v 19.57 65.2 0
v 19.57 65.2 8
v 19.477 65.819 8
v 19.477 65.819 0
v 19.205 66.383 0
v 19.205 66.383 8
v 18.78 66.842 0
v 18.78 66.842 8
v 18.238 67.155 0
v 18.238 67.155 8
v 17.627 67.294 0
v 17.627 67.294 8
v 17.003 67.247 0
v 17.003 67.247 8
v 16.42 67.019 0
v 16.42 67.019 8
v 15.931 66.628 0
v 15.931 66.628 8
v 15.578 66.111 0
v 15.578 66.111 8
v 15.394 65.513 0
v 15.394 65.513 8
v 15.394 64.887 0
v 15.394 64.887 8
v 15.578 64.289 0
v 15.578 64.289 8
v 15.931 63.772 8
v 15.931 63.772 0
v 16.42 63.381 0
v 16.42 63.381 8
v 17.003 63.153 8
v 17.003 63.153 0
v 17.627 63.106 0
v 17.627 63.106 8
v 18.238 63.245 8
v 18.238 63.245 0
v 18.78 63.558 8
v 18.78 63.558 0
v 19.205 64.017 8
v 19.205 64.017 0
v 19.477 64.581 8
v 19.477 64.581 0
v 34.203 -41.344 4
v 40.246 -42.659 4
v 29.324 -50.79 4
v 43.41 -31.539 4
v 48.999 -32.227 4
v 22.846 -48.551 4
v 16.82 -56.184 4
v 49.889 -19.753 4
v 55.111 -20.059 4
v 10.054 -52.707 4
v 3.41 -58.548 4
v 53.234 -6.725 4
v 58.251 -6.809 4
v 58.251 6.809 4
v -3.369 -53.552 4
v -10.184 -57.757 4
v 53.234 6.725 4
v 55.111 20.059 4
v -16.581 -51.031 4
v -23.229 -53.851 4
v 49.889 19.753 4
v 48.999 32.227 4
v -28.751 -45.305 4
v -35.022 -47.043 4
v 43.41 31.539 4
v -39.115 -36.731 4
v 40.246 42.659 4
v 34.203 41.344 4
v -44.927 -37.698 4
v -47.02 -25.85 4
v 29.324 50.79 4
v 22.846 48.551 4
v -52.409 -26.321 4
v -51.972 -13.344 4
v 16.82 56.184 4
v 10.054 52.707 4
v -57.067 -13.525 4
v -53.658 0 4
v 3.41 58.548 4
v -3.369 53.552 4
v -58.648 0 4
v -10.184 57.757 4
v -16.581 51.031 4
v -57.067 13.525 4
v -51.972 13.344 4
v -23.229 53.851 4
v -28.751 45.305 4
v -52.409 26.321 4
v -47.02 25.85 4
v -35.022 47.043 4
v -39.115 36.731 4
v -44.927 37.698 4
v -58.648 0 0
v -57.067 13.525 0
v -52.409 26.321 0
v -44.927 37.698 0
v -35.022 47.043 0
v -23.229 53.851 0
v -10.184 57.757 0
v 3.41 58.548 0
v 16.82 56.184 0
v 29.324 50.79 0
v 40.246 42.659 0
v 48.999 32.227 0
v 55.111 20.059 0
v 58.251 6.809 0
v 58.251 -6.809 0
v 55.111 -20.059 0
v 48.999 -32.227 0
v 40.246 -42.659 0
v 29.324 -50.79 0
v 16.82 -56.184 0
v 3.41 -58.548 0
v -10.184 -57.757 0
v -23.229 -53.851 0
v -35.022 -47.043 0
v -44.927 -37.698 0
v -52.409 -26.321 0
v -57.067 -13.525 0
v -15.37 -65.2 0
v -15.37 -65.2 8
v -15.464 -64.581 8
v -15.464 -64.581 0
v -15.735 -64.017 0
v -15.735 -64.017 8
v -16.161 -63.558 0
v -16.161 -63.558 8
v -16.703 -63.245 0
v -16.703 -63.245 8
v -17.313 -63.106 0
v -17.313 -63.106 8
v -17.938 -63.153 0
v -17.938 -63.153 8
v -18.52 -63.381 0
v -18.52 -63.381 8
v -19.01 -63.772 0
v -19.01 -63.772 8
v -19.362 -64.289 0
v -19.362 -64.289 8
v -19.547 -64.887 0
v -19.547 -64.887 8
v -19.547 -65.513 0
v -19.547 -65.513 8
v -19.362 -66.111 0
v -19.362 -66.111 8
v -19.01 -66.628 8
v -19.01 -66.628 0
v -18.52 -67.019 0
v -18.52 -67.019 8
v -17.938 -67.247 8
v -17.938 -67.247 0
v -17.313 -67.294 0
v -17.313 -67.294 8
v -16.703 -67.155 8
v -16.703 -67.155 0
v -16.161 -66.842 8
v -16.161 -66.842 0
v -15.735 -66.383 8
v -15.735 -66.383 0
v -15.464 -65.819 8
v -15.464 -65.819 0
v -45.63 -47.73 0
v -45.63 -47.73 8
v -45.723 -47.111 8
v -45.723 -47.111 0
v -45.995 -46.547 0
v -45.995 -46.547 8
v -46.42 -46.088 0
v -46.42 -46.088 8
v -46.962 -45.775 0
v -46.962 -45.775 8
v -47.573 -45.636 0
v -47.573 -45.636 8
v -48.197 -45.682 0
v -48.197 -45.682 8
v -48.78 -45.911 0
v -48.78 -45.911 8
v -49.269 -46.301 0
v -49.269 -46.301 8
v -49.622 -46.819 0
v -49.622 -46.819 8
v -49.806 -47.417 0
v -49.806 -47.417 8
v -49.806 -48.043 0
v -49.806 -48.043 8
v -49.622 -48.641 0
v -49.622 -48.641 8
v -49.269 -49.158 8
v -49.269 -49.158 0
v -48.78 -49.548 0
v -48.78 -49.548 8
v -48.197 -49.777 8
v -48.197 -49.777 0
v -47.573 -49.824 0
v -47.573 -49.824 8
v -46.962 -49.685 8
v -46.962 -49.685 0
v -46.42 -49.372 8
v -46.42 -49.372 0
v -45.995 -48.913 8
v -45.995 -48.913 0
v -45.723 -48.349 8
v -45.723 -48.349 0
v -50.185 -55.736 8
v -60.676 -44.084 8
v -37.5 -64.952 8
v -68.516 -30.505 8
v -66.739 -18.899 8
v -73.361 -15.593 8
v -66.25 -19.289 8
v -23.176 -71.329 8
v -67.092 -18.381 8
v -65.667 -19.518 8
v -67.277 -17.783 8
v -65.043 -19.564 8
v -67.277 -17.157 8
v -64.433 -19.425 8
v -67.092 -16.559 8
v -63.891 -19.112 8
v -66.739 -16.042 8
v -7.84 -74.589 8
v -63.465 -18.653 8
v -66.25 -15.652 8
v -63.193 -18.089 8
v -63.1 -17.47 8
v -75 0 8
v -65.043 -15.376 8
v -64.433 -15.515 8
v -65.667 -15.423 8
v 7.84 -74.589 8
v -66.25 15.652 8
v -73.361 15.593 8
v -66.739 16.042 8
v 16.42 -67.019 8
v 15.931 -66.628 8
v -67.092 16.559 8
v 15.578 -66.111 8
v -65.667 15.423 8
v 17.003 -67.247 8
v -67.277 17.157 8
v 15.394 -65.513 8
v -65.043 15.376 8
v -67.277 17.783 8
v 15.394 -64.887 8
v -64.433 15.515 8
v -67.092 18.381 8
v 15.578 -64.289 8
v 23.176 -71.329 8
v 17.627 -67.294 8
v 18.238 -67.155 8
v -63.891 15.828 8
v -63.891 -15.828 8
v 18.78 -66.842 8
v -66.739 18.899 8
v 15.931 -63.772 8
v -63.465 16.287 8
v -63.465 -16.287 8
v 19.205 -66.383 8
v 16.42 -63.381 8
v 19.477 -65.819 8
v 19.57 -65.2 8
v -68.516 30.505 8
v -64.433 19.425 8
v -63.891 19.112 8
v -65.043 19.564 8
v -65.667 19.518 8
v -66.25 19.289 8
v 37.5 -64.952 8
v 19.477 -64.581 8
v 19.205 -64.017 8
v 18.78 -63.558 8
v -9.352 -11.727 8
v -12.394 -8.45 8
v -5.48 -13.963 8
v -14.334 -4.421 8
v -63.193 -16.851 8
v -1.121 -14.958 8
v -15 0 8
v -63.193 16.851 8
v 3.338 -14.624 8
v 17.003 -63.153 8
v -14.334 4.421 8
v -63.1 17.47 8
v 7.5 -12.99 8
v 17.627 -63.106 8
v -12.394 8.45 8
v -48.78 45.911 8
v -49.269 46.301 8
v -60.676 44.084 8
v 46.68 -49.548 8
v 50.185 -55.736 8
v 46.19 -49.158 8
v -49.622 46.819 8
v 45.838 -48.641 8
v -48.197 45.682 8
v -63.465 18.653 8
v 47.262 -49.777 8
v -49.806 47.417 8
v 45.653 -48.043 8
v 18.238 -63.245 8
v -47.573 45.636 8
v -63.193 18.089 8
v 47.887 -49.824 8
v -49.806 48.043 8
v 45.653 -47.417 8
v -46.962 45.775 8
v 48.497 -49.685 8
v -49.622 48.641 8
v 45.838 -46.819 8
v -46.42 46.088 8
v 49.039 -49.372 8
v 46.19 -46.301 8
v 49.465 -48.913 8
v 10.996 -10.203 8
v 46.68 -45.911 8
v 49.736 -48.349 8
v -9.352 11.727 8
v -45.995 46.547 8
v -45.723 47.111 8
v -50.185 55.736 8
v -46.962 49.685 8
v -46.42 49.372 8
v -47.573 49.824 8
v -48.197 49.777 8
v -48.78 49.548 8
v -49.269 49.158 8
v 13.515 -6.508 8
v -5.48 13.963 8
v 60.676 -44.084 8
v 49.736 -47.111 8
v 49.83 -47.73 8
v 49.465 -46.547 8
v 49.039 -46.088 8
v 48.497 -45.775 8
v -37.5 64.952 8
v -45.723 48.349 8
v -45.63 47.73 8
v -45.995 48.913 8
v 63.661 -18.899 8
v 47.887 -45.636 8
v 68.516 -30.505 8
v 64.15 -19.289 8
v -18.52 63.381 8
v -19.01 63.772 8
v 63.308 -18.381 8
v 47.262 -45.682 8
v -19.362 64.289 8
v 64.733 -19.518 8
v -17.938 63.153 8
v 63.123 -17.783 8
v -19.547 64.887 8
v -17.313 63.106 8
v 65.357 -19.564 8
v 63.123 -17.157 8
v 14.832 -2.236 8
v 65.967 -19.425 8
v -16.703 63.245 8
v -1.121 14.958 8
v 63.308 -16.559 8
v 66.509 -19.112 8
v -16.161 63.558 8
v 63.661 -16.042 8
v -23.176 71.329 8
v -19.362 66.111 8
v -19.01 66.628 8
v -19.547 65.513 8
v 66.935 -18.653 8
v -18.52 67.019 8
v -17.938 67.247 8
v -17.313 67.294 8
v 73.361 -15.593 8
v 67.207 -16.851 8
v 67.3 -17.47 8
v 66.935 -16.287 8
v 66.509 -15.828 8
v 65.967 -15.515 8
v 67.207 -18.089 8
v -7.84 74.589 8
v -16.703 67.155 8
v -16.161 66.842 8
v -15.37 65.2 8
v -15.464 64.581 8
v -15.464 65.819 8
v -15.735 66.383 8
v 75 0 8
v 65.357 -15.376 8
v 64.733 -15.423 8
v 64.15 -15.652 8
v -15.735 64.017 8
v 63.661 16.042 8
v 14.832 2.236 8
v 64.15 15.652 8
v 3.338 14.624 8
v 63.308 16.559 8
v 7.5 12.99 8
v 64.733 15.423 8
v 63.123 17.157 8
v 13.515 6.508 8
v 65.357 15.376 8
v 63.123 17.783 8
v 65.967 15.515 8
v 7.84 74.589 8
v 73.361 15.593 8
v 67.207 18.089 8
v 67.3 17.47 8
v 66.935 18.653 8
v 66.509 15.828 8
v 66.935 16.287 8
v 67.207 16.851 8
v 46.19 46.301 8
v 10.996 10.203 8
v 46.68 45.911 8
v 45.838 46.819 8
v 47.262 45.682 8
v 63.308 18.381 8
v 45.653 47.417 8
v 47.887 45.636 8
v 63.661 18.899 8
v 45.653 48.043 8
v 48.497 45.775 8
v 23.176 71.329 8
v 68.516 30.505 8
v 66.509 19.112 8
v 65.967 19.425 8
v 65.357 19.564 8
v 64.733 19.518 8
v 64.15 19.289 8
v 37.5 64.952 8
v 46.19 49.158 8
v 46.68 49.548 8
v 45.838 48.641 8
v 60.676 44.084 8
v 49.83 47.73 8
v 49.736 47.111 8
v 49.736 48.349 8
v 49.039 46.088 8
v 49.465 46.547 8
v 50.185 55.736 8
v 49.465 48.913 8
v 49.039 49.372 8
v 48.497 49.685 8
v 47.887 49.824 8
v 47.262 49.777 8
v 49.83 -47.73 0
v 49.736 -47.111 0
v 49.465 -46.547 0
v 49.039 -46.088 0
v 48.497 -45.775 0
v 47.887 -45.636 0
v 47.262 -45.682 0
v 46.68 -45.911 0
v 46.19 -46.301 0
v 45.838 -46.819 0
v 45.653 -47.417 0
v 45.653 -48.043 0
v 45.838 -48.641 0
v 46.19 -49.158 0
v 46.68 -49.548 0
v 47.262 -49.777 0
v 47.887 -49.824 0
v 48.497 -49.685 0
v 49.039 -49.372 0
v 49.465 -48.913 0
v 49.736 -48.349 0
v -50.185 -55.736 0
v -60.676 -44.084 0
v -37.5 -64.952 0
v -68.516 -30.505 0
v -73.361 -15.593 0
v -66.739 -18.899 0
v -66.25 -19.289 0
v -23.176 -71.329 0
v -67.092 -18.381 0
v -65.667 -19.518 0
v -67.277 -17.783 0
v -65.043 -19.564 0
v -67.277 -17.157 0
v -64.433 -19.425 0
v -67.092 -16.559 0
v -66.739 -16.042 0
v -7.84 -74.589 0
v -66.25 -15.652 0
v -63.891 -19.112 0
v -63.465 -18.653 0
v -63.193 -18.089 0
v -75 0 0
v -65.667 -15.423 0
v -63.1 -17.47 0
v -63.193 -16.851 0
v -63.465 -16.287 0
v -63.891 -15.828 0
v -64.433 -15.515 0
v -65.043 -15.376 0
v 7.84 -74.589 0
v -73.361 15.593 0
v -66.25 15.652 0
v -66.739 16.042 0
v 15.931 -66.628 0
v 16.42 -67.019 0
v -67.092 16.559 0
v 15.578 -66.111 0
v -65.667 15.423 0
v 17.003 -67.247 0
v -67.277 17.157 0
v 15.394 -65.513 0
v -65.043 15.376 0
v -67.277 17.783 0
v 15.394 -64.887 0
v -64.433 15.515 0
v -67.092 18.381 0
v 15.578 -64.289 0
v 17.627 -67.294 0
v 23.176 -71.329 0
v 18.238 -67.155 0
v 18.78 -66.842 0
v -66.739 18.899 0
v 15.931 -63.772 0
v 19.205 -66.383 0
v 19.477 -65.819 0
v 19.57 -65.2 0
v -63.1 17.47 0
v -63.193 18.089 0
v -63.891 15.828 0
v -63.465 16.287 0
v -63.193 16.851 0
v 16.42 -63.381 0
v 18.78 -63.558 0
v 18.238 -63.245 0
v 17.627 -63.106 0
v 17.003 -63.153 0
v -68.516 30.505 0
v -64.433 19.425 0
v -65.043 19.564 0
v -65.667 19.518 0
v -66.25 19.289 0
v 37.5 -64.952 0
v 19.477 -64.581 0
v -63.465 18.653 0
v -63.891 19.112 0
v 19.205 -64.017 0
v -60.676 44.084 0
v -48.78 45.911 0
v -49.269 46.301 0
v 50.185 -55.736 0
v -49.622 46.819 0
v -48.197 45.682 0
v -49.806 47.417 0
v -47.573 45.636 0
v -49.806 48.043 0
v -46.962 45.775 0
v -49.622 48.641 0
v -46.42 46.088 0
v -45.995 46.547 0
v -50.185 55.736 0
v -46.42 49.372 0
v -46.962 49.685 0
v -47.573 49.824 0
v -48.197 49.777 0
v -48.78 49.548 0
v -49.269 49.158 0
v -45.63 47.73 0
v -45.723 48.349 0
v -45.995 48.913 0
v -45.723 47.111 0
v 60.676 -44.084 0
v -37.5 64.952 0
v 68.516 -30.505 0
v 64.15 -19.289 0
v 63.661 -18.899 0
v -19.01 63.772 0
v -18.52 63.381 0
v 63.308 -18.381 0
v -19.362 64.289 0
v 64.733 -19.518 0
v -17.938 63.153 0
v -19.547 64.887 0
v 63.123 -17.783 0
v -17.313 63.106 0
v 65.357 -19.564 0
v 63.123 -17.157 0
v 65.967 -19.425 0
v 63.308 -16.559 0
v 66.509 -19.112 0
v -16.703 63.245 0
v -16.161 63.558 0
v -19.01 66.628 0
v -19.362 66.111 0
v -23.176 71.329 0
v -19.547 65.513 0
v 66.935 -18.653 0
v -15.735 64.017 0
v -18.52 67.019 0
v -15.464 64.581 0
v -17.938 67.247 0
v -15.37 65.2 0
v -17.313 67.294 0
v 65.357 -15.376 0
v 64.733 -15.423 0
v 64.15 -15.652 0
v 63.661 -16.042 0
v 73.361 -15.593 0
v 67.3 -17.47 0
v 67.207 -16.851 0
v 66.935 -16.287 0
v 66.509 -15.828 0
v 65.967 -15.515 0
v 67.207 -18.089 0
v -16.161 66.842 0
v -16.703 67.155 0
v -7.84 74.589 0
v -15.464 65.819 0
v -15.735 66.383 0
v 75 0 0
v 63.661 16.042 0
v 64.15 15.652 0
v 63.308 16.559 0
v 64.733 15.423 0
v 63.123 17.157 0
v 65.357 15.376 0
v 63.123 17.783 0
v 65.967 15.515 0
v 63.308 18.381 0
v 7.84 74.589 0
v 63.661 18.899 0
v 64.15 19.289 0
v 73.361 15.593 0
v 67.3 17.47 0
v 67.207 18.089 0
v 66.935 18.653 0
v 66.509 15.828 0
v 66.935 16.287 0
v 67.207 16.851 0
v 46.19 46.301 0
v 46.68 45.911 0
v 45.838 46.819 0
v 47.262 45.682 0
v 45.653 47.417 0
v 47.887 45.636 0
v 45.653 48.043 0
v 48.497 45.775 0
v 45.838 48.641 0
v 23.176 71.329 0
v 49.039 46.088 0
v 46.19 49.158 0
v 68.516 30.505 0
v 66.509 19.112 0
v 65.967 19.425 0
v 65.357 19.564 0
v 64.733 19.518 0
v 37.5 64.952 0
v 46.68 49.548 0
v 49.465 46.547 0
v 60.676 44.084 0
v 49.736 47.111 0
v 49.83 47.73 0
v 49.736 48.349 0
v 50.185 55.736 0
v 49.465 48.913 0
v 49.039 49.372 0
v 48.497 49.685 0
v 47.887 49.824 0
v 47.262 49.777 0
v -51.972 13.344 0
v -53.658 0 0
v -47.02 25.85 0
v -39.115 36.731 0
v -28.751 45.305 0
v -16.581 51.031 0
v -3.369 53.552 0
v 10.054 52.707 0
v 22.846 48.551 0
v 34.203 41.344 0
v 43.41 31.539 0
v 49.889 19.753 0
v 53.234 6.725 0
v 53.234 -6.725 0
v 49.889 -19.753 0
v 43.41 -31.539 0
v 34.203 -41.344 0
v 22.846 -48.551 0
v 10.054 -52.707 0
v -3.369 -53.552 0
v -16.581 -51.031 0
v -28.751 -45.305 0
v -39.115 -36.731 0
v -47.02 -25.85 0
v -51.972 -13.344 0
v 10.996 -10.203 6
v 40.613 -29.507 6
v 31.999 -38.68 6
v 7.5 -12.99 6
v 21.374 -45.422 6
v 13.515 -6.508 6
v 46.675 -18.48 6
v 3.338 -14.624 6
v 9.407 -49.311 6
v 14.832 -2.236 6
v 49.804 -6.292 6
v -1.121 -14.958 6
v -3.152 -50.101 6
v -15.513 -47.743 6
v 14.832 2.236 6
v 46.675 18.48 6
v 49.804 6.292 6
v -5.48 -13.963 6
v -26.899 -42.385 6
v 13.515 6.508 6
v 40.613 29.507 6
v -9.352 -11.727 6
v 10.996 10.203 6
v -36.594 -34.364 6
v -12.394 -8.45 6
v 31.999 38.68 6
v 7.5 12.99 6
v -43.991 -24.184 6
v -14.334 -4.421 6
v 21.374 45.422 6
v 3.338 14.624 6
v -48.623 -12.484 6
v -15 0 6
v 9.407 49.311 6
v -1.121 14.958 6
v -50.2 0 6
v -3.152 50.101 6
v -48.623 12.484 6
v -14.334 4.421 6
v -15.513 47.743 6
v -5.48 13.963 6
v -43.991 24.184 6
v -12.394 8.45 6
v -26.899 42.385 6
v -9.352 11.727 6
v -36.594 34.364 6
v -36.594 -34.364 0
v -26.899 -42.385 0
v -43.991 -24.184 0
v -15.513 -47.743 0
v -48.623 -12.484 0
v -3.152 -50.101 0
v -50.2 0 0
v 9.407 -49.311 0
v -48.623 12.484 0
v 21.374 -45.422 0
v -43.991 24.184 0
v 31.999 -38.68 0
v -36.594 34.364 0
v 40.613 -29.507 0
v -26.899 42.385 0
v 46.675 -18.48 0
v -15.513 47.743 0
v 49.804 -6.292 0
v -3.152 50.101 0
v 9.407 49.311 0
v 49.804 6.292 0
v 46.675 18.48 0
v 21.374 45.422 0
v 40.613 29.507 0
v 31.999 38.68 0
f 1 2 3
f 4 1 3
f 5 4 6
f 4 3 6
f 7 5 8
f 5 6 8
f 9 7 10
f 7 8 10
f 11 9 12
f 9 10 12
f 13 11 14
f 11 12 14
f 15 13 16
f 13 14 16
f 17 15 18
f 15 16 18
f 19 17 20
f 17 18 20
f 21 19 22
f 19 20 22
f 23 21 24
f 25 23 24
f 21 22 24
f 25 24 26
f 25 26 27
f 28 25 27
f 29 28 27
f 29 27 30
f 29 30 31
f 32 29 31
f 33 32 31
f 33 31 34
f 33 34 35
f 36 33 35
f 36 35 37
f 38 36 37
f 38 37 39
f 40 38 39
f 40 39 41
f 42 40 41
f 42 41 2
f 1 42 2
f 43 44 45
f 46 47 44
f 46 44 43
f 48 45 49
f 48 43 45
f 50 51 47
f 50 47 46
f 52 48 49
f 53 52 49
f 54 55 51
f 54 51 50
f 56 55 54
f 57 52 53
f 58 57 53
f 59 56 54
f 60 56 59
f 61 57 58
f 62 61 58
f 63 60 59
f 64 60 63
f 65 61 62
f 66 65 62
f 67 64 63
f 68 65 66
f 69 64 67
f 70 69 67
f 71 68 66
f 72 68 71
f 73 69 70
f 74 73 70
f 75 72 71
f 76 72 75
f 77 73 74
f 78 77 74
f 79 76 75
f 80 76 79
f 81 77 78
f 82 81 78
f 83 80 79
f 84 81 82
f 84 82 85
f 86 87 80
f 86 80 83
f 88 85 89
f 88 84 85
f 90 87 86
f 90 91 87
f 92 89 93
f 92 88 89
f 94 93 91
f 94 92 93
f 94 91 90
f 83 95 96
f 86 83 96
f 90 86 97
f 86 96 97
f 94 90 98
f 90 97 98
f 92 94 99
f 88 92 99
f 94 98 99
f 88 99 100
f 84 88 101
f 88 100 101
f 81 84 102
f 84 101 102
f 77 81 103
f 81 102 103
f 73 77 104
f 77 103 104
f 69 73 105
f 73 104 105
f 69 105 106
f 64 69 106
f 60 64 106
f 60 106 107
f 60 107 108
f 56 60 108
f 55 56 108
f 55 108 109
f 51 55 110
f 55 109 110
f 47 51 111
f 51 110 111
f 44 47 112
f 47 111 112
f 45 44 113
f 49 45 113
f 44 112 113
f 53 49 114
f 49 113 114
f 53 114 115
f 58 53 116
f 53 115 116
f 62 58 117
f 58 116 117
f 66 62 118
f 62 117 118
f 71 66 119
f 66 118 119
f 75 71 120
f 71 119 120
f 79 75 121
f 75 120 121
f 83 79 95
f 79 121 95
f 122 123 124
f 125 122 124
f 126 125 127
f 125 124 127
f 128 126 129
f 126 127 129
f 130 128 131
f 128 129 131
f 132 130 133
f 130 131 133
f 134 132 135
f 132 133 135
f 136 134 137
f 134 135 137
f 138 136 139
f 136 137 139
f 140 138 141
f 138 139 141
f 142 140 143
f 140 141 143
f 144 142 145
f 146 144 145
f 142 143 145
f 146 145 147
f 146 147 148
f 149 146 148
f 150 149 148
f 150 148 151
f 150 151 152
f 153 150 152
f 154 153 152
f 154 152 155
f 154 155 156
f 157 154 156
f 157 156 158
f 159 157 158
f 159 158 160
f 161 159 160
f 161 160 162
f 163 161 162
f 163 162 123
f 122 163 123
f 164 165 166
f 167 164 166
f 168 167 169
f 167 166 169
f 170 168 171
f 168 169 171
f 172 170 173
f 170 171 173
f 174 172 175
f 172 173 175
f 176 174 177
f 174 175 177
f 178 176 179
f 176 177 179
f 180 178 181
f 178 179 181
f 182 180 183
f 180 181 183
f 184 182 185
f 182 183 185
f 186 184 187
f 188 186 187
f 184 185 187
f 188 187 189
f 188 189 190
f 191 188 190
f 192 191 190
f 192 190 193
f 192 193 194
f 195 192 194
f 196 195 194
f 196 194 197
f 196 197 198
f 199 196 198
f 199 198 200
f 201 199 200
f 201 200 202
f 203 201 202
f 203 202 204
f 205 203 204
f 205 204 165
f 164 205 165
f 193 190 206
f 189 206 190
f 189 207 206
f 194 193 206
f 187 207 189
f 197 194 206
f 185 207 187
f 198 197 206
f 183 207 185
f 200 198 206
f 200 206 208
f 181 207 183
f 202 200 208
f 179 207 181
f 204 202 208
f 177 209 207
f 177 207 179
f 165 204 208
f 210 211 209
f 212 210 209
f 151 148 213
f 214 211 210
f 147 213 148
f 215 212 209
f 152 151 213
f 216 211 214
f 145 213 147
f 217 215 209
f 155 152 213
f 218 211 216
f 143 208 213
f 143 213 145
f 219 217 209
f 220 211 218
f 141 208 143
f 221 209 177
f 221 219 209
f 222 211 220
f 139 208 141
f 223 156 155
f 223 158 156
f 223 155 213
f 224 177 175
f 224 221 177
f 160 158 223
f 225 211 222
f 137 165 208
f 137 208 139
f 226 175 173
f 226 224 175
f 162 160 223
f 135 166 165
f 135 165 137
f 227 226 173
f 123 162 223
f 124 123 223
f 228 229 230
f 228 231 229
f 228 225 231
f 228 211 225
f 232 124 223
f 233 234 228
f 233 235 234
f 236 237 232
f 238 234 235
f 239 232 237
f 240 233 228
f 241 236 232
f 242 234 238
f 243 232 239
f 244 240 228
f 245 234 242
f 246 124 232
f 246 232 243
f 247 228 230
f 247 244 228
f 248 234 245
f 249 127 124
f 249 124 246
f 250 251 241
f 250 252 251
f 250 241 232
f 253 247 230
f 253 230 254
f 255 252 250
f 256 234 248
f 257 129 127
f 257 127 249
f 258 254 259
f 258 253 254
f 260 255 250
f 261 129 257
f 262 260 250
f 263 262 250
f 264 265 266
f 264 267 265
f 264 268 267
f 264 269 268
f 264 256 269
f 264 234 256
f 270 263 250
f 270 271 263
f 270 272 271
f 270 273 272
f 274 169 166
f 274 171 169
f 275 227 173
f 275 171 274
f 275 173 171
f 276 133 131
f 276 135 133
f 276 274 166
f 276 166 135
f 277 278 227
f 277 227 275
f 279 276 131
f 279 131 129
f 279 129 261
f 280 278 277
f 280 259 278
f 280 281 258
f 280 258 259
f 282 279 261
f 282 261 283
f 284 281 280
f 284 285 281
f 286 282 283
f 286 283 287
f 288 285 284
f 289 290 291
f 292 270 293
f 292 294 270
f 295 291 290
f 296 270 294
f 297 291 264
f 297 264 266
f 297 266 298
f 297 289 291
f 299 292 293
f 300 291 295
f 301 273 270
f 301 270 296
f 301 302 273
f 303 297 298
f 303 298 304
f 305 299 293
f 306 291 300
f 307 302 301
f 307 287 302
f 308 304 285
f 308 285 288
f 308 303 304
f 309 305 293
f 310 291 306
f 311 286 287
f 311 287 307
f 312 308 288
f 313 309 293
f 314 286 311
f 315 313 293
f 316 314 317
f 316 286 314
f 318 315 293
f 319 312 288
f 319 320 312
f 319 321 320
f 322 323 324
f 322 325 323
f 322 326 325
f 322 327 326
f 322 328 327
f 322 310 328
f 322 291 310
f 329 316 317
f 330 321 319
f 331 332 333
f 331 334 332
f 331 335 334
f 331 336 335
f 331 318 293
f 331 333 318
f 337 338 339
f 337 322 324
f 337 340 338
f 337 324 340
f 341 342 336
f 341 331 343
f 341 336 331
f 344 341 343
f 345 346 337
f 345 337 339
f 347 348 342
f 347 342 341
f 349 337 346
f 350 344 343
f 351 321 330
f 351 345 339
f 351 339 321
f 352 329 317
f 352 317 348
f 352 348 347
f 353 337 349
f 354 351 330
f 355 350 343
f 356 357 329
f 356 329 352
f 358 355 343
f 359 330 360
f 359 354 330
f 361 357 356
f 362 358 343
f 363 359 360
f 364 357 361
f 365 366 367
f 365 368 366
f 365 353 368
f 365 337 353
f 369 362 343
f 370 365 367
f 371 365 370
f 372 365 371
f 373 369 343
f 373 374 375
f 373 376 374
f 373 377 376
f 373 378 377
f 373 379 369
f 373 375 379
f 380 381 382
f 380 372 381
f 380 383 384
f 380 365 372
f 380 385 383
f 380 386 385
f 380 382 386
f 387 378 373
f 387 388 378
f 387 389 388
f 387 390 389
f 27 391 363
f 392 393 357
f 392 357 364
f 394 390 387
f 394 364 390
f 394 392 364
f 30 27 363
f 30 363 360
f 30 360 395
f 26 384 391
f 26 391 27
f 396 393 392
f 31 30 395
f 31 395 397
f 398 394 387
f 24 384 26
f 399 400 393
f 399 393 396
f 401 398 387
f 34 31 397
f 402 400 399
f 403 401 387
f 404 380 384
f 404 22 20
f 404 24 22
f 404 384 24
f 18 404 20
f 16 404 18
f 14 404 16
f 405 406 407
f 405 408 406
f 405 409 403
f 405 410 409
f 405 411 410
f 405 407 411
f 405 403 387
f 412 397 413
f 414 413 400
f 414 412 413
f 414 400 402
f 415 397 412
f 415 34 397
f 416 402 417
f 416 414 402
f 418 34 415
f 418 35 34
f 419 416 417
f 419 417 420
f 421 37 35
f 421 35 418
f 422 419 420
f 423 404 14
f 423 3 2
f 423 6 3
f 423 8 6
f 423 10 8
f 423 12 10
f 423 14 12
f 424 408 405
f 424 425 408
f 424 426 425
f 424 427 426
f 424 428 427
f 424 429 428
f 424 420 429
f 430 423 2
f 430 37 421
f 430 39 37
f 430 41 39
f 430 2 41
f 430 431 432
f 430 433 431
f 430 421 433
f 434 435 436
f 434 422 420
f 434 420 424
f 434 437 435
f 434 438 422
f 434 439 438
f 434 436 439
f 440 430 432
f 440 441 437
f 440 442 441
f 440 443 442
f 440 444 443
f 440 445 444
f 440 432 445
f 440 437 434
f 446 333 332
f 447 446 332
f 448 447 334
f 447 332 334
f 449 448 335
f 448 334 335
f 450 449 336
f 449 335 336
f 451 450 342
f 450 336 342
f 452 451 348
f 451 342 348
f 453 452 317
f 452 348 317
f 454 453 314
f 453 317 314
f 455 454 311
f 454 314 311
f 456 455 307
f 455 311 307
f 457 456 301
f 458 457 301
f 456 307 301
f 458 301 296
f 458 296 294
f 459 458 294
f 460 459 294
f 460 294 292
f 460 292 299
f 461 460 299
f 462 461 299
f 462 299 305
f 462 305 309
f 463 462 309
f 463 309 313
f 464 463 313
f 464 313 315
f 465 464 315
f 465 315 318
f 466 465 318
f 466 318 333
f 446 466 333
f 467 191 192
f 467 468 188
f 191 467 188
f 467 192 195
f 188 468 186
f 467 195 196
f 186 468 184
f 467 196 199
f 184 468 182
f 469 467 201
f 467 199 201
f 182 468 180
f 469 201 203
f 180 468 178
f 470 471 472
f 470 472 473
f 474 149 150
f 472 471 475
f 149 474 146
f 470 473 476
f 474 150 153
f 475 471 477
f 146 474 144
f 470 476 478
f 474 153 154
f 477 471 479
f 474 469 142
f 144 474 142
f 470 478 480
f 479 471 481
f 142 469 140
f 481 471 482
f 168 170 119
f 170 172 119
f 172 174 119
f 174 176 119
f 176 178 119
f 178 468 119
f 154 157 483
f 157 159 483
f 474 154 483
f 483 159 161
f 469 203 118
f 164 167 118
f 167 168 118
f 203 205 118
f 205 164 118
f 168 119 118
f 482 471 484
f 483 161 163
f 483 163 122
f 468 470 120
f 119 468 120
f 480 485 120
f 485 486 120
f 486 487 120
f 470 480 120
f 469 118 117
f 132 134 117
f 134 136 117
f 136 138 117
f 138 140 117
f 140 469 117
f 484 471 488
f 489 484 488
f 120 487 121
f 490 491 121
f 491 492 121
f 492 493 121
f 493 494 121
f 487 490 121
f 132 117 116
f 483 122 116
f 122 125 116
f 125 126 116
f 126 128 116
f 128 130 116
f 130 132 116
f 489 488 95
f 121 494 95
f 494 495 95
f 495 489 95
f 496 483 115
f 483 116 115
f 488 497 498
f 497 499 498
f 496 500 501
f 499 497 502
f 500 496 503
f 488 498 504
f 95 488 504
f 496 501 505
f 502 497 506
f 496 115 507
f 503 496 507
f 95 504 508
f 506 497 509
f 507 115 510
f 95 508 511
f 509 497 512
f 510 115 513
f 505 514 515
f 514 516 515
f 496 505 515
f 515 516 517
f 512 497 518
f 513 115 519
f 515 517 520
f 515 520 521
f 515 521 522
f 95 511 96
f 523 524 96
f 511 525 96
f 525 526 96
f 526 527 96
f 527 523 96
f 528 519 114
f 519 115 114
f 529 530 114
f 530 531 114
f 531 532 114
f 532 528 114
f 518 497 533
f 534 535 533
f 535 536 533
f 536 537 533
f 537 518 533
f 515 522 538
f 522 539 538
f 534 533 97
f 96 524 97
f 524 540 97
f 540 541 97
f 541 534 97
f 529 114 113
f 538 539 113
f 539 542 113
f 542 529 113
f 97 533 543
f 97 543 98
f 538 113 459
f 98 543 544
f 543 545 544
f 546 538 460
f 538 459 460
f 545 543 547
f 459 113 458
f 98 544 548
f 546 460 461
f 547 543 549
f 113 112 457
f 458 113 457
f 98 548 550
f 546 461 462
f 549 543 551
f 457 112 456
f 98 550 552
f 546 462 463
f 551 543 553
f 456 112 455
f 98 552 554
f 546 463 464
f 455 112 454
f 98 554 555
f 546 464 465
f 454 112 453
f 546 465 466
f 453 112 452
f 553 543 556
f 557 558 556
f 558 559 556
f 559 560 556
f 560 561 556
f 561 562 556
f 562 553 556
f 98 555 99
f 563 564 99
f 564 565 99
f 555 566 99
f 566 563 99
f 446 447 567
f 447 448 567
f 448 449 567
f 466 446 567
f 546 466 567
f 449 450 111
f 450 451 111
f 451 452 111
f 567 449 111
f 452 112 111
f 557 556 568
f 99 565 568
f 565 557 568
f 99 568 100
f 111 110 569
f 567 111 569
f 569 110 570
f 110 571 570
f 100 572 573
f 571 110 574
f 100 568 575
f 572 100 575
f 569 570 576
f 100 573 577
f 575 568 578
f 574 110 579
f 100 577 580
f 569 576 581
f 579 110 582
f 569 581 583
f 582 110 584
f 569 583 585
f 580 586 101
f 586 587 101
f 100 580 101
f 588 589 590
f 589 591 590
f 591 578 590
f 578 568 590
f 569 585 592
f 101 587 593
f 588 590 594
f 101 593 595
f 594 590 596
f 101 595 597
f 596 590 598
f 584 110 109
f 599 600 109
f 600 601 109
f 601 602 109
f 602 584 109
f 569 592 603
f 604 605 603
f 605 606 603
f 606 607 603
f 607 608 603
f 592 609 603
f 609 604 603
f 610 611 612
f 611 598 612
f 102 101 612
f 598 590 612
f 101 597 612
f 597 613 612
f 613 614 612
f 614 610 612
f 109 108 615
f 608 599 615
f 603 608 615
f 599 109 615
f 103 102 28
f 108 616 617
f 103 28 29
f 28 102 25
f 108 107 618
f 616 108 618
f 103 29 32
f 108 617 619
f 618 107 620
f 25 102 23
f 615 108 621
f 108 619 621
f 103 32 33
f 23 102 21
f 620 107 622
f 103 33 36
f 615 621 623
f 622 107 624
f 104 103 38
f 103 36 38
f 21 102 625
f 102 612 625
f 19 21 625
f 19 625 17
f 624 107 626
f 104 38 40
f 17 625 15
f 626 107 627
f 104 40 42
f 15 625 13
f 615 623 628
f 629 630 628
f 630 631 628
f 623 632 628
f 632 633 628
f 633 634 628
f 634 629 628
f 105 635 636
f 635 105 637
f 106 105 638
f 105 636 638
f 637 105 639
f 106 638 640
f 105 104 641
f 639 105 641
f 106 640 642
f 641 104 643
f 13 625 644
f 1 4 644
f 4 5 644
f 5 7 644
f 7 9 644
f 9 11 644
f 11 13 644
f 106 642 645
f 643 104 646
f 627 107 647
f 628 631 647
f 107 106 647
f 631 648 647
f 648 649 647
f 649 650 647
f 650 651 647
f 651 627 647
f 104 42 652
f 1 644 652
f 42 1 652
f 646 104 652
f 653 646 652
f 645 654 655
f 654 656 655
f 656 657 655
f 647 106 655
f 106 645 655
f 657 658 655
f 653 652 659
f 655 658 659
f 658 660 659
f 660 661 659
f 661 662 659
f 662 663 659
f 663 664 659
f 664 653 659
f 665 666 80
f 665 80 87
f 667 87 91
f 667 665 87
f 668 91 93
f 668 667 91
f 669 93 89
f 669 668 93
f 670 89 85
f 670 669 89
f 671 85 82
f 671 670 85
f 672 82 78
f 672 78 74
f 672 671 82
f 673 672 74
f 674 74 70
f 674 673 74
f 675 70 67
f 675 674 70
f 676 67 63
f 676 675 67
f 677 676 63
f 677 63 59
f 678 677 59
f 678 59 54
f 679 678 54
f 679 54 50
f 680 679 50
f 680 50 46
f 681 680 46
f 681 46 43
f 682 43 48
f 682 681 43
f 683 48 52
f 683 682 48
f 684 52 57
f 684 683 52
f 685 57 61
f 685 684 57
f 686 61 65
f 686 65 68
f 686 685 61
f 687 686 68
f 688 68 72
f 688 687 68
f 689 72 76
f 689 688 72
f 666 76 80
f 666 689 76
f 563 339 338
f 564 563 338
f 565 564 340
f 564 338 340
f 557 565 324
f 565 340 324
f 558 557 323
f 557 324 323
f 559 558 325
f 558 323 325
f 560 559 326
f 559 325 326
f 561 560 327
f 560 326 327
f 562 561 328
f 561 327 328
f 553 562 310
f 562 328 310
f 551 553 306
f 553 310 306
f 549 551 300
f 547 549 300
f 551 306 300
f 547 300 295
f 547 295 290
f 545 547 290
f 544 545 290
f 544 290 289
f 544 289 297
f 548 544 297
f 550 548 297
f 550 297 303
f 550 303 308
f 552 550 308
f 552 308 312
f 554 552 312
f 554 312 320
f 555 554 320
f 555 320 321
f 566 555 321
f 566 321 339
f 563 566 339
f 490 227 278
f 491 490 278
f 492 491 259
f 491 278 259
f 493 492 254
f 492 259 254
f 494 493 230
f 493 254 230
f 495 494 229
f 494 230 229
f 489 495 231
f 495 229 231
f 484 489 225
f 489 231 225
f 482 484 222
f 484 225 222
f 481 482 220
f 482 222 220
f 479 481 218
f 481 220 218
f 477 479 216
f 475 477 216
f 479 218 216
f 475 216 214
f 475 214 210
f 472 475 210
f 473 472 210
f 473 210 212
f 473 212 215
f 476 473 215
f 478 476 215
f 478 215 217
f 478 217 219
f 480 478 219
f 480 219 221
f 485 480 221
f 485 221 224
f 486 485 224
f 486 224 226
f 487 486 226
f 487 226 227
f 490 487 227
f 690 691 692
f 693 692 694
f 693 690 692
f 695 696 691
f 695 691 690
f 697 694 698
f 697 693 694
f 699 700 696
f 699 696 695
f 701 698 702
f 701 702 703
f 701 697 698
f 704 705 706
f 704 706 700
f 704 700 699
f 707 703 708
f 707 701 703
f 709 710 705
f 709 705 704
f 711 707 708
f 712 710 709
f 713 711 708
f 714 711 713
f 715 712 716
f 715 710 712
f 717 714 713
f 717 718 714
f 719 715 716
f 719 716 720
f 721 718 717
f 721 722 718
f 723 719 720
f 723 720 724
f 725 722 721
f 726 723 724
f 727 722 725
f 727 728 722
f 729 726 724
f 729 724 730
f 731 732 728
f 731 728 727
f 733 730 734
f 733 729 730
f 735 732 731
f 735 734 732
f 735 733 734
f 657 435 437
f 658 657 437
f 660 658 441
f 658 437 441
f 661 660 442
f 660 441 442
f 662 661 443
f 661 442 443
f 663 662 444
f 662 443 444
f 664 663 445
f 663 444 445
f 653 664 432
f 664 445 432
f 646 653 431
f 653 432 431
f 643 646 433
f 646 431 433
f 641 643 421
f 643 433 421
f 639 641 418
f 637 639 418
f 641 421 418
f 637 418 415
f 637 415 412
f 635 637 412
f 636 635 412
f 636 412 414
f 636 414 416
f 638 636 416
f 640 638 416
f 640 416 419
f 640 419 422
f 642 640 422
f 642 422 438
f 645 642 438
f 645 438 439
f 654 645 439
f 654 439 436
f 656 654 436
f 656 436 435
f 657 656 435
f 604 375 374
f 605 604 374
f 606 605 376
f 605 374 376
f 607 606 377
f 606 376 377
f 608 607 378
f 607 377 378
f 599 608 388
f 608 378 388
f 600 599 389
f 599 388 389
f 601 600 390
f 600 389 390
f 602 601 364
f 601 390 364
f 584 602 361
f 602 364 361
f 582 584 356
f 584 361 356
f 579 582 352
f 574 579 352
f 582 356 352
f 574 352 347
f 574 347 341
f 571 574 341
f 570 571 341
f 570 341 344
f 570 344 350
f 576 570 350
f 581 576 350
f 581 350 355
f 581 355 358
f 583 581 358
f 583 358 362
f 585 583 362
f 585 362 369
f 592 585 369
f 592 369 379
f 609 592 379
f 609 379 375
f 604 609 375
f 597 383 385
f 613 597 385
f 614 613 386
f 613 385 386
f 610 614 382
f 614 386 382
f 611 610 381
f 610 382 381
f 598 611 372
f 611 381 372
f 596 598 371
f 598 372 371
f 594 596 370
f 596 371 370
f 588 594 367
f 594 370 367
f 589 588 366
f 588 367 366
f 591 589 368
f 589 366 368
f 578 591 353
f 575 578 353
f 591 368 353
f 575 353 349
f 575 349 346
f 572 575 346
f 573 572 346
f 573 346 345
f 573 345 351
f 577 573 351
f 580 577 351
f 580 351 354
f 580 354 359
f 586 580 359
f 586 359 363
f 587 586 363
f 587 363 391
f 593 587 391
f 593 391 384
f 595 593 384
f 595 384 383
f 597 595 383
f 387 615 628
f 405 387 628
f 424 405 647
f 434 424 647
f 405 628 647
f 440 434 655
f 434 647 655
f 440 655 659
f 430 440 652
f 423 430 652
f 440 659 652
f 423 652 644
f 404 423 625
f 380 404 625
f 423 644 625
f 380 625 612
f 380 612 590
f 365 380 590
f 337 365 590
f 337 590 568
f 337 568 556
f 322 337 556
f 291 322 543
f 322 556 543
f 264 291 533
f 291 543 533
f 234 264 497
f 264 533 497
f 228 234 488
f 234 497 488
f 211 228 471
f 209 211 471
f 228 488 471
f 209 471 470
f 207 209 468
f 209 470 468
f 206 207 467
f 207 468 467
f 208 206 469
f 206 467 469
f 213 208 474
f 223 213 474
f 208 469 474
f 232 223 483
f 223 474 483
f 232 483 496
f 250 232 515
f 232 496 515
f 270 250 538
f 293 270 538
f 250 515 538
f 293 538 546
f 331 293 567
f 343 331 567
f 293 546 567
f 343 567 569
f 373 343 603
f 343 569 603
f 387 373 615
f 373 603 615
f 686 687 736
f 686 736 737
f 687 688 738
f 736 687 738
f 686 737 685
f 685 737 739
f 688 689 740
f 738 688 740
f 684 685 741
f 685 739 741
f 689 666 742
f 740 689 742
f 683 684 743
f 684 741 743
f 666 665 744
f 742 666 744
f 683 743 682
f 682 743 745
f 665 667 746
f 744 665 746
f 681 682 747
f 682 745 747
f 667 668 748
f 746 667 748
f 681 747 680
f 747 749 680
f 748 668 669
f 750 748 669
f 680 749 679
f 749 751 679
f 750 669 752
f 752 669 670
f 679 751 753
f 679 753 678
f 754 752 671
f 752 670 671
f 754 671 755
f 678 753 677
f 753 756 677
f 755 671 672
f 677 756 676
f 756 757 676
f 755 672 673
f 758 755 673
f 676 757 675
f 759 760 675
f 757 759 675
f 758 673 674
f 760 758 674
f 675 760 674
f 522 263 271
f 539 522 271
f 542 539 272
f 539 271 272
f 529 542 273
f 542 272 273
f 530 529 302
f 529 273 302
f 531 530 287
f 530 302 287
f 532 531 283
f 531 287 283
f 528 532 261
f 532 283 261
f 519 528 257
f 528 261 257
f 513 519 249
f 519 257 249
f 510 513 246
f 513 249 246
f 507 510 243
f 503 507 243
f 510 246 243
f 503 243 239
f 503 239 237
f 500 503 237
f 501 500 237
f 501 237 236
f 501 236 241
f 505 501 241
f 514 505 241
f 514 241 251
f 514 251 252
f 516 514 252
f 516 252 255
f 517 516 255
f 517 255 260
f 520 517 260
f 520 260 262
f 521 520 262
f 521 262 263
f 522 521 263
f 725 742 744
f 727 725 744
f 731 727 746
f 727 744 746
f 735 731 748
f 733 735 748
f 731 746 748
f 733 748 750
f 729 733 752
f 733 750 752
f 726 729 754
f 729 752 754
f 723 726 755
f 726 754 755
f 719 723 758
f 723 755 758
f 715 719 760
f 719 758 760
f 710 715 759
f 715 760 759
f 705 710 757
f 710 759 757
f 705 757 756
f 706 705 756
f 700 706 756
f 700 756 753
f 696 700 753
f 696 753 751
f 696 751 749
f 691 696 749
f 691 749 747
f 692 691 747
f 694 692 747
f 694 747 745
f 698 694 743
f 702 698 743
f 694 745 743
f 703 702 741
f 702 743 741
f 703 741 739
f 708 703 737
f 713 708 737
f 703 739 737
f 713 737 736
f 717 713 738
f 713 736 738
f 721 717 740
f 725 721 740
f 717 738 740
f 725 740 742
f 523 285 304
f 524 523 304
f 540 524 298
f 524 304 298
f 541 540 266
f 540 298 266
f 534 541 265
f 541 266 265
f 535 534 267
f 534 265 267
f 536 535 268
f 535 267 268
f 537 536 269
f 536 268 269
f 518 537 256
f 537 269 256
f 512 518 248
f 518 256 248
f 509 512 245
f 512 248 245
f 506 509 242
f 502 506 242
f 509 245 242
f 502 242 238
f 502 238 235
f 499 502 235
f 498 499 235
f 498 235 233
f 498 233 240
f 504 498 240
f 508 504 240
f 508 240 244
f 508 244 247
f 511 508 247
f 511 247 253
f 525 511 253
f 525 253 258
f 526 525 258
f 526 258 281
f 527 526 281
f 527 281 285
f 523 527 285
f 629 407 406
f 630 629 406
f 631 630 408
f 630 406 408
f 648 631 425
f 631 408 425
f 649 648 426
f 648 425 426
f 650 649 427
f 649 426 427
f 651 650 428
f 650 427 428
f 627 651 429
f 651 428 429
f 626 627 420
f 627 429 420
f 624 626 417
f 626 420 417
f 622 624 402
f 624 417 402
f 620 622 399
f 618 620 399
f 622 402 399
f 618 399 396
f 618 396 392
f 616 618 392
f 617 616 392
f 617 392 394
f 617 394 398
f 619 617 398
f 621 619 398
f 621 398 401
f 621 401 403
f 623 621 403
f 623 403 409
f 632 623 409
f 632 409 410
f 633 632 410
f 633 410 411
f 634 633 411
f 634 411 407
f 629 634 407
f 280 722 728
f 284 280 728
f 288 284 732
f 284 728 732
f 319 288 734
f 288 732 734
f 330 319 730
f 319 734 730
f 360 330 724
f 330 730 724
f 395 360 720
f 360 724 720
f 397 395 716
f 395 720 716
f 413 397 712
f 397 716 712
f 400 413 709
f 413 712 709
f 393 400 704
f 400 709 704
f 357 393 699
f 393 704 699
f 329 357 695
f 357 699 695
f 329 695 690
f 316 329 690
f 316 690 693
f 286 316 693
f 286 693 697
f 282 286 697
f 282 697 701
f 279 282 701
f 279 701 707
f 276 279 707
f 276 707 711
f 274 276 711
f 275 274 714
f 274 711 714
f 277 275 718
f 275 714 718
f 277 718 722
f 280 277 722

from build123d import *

# Parameters (mm, degrees)
SKETCH1_R             = 75
BOSS_EXTRUDE1_DEPTH   = 8
M5X0_8_TAPPED_HOLE1_D = 4.2
SKETCH11_R            = 50.2
CUT_EXTRUDE3_DEPTH    = 6
SKETCH12_R            = 58.6475
SKETCH12_R_2          = 53.6575
CUT_EXTRUDE4_DEPTH    = 4
SKETCH13_R            = 15
CUT_EXTRUDE5_DEPTH    = 2


with BuildPart() as part:
    # Sketch1 → Boss-Extrude1 (new body)
    with BuildSketch(Plane.XY):
        Circle(SKETCH1_R)
    extrude(amount=BOSS_EXTRUDE1_DEPTH)

    # M5x0.8 Tapped Hole1 (through all)
    with Locations(Plane(origin=(0, 0, 0), x_dir=(-1, 0, 0), z_dir=(0, 0, -1))):
        with Locations((-17.470285544, -65.199993275), (-47.72970773, 47.72970773), (65.199993275, -17.470285544), (47.72970773, -47.72970773), (-65.199993275, 17.470285544), (-17.470285544, 65.199993275), (-65.199993275, -17.470285544), (-47.72970773, -47.72970773), (17.470285544, -65.199993275), (65.199993275, 17.470285544), (47.72970773, 47.72970773), (17.470285544, 65.199993275)):
            Hole(M5X0_8_TAPPED_HOLE1_D / 2)

    # Sketch11 → Cut-Extrude3 (cut)
    with BuildSketch(Plane(origin=(0, 0, 0), x_dir=(-1, 0, 0), z_dir=(0, 0, -1))):
        Circle(SKETCH11_R)
    extrude(amount=-CUT_EXTRUDE3_DEPTH, mode=Mode.SUBTRACT)

    # Sketch12 → Cut-Extrude4 (cut)
    with BuildSketch(Plane(origin=(0, 0, 0), x_dir=(-1, 0, 0), z_dir=(0, 0, -1))):
        Circle(SKETCH12_R)
        Circle(SKETCH12_R_2, mode=Mode.SUBTRACT)
    extrude(amount=-CUT_EXTRUDE4_DEPTH, mode=Mode.SUBTRACT)

    # Sketch13 → Cut-Extrude5 (cut)
    with BuildSketch(Plane(origin=(0, 0, 6), x_dir=(-1, 0, 0), z_dir=(0, 0, -1))):
        Circle(SKETCH13_R)
    extrude(amount=-CUT_EXTRUDE5_DEPTH, mode=Mode.SUBTRACT)


solid = part.part
